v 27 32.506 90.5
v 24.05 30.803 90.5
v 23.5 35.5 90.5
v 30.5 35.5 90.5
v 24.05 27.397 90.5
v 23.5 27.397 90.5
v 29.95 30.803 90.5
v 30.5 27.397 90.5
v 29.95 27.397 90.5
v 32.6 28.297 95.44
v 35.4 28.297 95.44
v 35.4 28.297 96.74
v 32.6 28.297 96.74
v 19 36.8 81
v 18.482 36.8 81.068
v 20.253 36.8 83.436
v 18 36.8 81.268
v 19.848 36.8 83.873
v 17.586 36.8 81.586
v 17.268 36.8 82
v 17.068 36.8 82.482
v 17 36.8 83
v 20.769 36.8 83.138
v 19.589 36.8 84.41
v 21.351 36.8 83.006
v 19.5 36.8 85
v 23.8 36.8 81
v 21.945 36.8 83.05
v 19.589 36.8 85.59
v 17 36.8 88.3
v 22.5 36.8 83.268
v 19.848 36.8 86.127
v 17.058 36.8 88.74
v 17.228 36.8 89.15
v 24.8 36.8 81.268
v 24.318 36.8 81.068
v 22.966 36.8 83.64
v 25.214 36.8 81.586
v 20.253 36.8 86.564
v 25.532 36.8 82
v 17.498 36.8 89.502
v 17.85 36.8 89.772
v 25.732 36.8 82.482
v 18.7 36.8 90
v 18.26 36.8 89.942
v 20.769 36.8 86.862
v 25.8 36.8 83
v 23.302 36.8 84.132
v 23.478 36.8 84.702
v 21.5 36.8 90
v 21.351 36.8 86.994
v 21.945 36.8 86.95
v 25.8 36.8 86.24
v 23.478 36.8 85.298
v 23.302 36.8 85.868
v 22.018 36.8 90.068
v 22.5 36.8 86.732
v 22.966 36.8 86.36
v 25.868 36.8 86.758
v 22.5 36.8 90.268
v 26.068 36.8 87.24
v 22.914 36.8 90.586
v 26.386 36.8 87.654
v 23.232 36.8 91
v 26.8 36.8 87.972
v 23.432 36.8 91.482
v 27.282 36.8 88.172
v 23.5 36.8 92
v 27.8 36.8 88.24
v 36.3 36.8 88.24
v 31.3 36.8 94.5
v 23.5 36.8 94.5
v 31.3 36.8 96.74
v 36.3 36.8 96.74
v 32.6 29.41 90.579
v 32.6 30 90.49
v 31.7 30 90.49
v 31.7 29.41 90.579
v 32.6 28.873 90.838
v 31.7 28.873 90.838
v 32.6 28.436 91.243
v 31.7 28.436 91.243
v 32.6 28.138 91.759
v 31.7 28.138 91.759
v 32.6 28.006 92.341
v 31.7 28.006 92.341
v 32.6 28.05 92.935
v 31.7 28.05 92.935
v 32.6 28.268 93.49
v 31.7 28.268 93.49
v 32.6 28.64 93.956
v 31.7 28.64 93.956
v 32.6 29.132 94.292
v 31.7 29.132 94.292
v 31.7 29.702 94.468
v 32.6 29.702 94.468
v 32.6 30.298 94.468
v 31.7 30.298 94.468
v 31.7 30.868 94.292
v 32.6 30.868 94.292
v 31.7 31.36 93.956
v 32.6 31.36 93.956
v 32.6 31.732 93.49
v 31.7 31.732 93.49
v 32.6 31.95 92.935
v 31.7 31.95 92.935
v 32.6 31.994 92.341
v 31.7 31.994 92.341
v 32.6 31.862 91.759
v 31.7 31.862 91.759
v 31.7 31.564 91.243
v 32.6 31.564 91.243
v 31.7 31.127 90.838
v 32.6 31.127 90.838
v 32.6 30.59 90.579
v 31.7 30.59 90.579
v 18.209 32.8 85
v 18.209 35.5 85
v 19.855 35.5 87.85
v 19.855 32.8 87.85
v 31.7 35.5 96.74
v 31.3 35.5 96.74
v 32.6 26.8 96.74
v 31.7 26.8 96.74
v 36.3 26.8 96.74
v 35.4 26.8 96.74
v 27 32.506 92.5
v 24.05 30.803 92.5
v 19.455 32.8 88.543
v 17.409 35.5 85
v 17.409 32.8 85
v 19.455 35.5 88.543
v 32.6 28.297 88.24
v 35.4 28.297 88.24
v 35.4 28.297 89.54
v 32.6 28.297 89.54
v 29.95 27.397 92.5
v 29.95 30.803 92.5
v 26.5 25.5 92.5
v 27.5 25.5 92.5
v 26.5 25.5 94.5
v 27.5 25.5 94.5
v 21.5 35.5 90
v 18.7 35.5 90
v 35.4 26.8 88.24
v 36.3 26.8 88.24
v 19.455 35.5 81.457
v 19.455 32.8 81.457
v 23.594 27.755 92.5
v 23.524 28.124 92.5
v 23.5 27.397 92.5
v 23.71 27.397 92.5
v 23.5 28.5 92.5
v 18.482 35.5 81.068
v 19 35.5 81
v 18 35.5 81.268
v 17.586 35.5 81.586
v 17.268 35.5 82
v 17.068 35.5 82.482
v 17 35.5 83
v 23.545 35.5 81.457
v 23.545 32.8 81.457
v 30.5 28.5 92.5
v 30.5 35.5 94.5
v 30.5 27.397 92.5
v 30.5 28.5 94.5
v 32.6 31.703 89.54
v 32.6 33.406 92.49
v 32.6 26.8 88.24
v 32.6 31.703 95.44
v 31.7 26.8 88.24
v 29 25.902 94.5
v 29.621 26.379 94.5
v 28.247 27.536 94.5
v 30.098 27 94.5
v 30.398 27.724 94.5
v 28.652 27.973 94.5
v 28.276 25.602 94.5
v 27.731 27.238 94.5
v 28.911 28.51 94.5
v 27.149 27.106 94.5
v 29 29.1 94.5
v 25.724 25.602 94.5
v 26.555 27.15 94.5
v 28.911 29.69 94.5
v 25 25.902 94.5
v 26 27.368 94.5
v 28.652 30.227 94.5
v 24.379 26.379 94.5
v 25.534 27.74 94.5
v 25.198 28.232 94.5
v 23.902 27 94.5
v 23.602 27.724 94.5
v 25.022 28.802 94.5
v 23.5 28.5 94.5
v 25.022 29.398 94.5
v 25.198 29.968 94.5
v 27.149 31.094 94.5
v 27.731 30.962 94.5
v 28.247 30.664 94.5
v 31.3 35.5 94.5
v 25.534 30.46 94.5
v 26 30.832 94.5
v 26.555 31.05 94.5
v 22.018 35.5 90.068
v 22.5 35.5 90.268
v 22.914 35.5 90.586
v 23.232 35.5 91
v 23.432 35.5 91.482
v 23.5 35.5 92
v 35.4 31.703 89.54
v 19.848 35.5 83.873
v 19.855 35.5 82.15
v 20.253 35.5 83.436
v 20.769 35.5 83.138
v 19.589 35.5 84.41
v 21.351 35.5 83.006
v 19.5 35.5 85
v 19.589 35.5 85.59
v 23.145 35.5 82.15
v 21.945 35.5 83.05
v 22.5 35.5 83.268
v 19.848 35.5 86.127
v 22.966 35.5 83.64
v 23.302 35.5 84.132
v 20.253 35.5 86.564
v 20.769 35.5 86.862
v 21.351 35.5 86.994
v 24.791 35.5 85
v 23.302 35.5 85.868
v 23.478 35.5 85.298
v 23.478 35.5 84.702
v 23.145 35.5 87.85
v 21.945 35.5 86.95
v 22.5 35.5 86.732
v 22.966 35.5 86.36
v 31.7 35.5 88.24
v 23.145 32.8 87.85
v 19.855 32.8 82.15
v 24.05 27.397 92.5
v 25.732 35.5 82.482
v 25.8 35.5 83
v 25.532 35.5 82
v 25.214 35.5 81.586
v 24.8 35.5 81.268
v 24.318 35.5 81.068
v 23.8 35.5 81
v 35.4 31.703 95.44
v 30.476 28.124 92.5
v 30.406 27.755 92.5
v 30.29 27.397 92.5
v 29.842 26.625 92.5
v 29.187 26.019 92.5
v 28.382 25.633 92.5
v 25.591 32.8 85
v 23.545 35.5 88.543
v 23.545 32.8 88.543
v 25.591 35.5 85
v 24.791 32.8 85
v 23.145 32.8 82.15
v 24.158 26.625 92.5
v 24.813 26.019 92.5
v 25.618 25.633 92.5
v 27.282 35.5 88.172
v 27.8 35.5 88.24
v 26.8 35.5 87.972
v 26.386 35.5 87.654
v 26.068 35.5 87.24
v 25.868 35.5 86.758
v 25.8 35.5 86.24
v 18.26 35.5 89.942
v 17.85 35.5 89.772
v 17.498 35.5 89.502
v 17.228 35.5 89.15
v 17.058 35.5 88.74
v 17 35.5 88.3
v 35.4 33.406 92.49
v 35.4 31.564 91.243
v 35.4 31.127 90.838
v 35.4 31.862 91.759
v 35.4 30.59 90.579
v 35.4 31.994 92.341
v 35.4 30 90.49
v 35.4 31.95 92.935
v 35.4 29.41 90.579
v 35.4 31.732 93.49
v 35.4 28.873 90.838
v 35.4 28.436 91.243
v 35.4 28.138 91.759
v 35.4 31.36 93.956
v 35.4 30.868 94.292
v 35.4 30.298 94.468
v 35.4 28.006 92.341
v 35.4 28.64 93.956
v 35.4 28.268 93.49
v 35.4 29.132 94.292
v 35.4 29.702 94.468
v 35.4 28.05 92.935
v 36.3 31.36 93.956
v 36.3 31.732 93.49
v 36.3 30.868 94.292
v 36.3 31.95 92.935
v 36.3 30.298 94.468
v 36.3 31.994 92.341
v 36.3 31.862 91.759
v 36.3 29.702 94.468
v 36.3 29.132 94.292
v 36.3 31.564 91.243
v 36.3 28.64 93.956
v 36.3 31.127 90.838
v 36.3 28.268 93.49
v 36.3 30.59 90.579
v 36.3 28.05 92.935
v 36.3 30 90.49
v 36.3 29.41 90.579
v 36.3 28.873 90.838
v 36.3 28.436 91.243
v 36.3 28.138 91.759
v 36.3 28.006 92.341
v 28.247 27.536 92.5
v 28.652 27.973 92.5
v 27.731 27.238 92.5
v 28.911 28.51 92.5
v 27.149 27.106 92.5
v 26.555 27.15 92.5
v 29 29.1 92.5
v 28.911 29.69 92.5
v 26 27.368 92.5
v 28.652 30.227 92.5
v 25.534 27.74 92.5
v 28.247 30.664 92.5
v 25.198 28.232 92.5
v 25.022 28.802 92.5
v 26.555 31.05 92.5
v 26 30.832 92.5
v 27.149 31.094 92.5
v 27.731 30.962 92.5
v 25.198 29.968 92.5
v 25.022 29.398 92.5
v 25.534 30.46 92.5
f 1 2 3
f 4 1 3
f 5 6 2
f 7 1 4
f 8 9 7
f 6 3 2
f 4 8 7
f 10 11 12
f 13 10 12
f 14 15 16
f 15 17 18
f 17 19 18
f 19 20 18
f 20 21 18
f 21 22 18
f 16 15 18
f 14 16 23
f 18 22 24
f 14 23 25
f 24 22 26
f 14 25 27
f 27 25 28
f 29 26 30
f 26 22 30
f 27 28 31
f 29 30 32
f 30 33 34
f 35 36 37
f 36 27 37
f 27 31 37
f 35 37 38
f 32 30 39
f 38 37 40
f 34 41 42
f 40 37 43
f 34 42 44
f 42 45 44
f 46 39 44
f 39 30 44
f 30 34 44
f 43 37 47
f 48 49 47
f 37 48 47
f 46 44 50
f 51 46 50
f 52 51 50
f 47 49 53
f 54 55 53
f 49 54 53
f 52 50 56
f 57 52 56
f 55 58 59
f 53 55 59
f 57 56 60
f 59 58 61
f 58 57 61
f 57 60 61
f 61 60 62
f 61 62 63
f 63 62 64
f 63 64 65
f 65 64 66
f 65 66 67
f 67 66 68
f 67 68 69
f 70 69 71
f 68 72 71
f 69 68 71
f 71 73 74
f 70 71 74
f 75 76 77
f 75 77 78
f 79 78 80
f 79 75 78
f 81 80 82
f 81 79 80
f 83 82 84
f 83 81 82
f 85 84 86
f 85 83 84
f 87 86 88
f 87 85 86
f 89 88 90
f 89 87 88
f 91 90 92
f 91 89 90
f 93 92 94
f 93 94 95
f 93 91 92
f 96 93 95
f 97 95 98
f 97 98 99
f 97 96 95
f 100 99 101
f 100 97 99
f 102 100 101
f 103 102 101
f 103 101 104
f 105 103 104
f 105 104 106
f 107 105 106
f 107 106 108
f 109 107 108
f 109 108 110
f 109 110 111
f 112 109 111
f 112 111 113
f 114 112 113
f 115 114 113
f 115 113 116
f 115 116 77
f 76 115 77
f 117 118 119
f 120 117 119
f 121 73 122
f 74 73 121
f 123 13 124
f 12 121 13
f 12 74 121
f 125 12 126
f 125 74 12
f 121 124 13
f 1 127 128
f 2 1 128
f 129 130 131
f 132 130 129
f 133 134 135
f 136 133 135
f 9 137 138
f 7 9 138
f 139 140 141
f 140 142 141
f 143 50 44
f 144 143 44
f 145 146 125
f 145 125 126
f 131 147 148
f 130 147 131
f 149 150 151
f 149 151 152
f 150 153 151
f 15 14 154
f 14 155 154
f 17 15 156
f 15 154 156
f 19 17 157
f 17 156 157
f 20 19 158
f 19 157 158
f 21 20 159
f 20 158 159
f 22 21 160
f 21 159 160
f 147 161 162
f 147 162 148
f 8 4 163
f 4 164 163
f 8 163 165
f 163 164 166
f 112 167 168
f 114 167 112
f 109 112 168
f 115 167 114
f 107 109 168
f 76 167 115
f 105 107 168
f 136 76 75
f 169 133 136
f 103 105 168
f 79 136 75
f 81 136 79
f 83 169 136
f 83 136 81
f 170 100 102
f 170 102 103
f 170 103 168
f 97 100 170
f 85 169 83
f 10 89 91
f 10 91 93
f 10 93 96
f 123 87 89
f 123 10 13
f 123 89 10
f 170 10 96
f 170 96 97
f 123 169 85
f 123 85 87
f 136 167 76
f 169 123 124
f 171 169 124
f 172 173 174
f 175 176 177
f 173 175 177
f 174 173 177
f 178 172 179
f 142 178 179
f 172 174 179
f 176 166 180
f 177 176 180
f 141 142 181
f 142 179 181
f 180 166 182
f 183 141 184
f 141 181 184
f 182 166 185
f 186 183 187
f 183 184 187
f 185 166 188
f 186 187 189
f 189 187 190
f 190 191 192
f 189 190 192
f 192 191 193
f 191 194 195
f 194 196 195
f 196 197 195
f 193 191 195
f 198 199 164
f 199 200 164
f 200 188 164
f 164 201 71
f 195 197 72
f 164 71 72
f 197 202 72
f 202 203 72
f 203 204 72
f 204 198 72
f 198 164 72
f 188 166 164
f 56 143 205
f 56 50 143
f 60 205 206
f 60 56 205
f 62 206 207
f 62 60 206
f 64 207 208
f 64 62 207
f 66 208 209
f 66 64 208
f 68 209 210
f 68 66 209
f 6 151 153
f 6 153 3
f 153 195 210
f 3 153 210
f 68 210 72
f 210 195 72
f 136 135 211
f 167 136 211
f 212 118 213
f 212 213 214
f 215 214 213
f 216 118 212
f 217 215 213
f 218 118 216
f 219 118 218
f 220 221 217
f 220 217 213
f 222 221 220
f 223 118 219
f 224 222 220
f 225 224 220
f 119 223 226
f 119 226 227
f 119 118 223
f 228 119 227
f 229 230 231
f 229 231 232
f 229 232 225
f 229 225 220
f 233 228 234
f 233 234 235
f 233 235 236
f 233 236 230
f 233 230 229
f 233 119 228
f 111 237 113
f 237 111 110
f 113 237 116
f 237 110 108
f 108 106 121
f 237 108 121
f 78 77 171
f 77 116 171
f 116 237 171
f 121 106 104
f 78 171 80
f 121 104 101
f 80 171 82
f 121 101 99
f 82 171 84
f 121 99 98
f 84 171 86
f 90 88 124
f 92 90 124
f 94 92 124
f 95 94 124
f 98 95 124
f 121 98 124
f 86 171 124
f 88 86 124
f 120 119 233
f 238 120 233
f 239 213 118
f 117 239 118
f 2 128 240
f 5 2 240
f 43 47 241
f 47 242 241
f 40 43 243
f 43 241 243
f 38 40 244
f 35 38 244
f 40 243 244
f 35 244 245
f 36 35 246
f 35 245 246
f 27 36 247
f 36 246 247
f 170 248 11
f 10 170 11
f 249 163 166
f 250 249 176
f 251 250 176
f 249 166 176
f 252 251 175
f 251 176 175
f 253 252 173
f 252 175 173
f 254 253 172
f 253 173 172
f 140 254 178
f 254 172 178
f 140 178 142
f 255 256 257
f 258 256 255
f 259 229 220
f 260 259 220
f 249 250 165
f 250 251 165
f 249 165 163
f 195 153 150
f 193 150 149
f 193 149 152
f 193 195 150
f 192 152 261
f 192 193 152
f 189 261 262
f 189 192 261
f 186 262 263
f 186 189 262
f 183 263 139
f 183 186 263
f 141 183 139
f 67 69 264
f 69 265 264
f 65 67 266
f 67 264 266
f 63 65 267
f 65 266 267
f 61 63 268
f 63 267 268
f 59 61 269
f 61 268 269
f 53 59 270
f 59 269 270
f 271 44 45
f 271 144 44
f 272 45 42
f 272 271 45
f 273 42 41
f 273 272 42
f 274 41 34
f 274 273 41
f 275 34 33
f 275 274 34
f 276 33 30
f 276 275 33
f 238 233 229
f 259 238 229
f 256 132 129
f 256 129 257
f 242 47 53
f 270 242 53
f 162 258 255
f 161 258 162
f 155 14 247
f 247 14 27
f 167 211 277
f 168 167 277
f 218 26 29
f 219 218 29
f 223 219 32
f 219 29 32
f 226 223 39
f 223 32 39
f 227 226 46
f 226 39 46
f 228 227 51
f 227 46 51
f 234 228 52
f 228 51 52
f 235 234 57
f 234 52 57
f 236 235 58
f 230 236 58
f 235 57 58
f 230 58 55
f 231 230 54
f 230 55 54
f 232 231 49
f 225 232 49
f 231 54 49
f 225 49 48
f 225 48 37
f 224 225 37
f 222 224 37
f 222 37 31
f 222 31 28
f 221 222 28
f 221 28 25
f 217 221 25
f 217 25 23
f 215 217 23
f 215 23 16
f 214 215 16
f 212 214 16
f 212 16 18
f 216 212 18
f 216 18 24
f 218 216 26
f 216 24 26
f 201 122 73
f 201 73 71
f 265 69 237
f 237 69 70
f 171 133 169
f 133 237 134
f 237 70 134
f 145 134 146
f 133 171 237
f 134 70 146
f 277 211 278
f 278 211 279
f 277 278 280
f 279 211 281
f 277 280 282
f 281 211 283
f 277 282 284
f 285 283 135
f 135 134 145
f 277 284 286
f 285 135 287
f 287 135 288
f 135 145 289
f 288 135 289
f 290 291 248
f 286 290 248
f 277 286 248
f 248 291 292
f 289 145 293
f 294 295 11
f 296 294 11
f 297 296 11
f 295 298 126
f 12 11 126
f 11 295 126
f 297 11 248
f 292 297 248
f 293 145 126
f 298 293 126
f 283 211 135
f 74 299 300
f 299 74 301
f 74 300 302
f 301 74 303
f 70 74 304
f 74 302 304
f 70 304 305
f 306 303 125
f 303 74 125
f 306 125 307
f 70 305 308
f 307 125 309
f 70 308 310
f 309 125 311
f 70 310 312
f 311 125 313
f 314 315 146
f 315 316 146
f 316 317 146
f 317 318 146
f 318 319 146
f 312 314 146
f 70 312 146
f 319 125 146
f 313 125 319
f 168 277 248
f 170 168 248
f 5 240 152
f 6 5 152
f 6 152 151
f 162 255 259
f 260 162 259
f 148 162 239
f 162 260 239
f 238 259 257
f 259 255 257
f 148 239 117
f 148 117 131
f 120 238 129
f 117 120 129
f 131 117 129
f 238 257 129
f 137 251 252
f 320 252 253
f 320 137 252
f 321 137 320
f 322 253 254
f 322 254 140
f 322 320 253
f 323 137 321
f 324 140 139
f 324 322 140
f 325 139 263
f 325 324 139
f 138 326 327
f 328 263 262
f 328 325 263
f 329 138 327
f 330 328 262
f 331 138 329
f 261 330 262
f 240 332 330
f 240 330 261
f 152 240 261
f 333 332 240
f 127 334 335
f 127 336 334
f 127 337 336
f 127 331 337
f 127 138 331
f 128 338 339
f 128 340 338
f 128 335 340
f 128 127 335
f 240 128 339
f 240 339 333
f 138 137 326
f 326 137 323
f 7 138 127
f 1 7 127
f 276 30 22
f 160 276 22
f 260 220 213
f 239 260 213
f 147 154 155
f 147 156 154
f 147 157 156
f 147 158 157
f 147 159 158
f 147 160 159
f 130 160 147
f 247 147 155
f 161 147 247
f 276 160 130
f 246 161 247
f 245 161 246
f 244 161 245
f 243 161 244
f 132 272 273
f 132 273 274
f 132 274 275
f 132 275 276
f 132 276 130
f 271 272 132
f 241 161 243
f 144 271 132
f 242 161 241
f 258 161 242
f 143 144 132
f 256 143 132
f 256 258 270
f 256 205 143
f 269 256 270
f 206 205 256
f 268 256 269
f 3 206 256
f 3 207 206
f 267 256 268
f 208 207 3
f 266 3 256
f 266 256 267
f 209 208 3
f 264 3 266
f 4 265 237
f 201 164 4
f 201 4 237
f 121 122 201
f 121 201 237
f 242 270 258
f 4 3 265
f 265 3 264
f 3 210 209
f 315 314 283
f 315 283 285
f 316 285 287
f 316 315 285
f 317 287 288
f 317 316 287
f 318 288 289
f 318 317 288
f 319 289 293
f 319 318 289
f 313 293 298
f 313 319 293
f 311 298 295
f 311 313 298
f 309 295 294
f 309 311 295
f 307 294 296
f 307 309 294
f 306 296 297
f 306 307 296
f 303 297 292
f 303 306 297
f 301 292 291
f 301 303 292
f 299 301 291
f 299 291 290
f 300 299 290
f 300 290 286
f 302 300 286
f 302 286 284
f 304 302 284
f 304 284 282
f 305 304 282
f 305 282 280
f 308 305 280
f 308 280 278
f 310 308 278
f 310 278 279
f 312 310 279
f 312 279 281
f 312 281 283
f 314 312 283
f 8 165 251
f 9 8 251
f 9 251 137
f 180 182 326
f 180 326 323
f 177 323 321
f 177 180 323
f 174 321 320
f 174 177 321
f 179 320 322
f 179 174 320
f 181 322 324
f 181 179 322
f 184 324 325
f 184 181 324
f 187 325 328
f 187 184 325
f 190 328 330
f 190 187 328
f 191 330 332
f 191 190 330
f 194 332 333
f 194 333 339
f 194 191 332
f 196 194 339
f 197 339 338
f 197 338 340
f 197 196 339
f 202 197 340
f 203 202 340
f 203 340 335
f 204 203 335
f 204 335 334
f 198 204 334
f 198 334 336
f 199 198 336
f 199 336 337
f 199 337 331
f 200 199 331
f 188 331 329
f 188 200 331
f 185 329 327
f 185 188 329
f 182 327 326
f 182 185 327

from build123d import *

# Parameters (mm, degrees)
SKETCH037_R     = 2
PAD022_DEPTH    = 1.3
PAD023_DEPTH    = 2.7
SKETCH039_W     = 7
SKETCH039_H     = 2
PAD024_DEPTH    = 10
SKETCH040_R     = 2
POCKET010_DEPTH = 2
SKETCH041_W     = 8.5
SKETCH041_H     = 8.9
SKETCH041_R     = 2
PAD025_DEPTH    = 5
POCKET011_START = -0.9
POCKET011_DEPTH = 2.8
SKETCH043_W     = 4.5
SKETCH043_H     = 4.5
POCKET012_DEPTH = 1.301
FILLET005_R     = 2
FILLET006_R     = 1.7
FILLET007_R     = 3
SKETCH052_W     = 5
SKETCH052_H     = 8.5
POCKET017_DEPTH = 0.2
SKETCH053_W     = 0.4
SKETCH053_H     = 8.5
POCKET018_DEPTH = 8.7
PAD031_DEPTH    = 2


with BuildPart() as f_3dp_angle_bracket_top:
    # Sketch037 → Pad022 (new body)
    with BuildSketch(Plane.XZ):
        Polygon((4.5, -4), (-4.3, -4), (-4.3, 3.24), (-14.8, 3.24), (-14.8, 7.49), (-14.8, 11.74), (-9.8, 11.74), (-9.8, 9.5), (2.5, 9.5), (2.5, 5), (4.5, 5), align=None)
        Circle(SKETCH037_R, mode=Mode.SUBTRACT)
    extrude(amount=PAD022_DEPTH)

    # Sketch038 (on Face14 of Pad022) → Pad023 (join)
    with BuildSketch(Plane.XZ.offset(1.3)):
        Polygon((-4.090897, 0), (-2.045448, -3.54282), (2.045448, -3.54282), (4.090897, 0), (2.045448, 3.54282), (-2.045448, 3.54282), align=None)
        Polygon((-3.290897, 0), (-1.645448, -2.85), (1.645448, -2.85), (3.290897, 0), (1.645448, 2.85), (-1.645448, 2.85), align=None, mode=Mode.SUBTRACT)
    extrude(amount=PAD023_DEPTH)

    # Sketch039 (on Face5 of Pad023) → Pad024 (join)
    with BuildSketch(Plane.XZ.offset(1.3)):
        with Locations((-5.5, 8.5)):
            Rectangle(SKETCH039_W, SKETCH039_H)
    extrude(amount=PAD024_DEPTH)

    # Sketch040 (on Face24 of Pad024) → Pocket010 (cut)
    with BuildSketch(Plane(origin=(0, 0, 9.5), x_dir=(-1, 0, 0), z_dir=(0, 0, 1))):
        with Locations((5.5, 7.7)):
            Circle(SKETCH040_R)
    extrude(amount=-POCKET010_DEPTH, mode=Mode.SUBTRACT)

    # Sketch041 (on Face6 of Pocket010) → Pad025 (join)
    with BuildSketch(Plane(origin=(-14.8, 0, 0), x_dir=(0, 0, -1), z_dir=(-1, 0, 0))):
        with Locations((-7.49, 5.75)):
            Rectangle(SKETCH041_W, SKETCH041_H)
        with Locations((-7.49, 6.8)):
            Circle(SKETCH041_R, mode=Mode.SUBTRACT)
    extrude(amount=-PAD025_DEPTH)

    # Sketch042 (on Face7 of Pad025) → Pocket011 (cut)
    with BuildSketch(Plane(origin=(-14.8, 0, 0), x_dir=(0, 0, -1), z_dir=(-1, 0, 0)).offset(POCKET011_START)):
        Polygon((-10.44, 8.503183), (-11.74, 8.503183), (-11.74, 10.2), (-3.24, 10.2), (-3.24, 8.503183), (-4.54, 8.503183), (-4.54, 5.096817), (-7.49, 3.393633), (-10.44, 5.096817), align=None)
    extrude(amount=-POCKET011_DEPTH, mode=Mode.SUBTRACT)

    # Sketch043 (on Face24 of Pocket011) → Pocket012 (cut, through all)
    with BuildSketch(Plane.XZ.offset(1.3)):
        with Locations((0.25, 7.25)):
            Rectangle(SKETCH043_W, SKETCH043_H)
    extrude(amount=-POCKET012_DEPTH, mode=Mode.SUBTRACT)

    # Fillet005
    fillet005_edges = [f_3dp_angle_bracket_top.edges().sort_by_distance(p)[0] for p in [
        (-2, -0.65, 5),
        (4.5, -0.65, -4),
        (-4.3, -0.65, -4),
        (-4.3, -0.65, 3.24),
    ]]
    fillet(fillet005_edges, radius=FILLET005_R)

    # Fillet006
    fillet006_edges = [f_3dp_angle_bracket_top.edges().sort_by_distance(p)[0] for p in [
        (4.5, -0.65, 5),
    ]]
    fillet(fillet006_edges, radius=FILLET006_R)

    # Fillet007
    fillet007_edges = [f_3dp_angle_bracket_top.edges().sort_by_distance(p)[0] for p in [
        (-9, -11.3, 8.5),
        (-2, -11.3, 8.5),
    ]]
    fillet(fillet007_edges, radius=FILLET007_R)

    # Sketch052 (on Face43 of Fillet007) → Pocket017 (cut)
    with BuildSketch(Plane.XZ.offset(10.2)):
        with Locations((-12.3, 7.49)):
            Rectangle(SKETCH052_W, SKETCH052_H)
    extrude(amount=-POCKET017_DEPTH, mode=Mode.SUBTRACT)

    # Sketch053 (on Face37 of Pocket017) → Pocket018 (cut)
    with BuildSketch(Plane.XZ.offset(10)):
        with Locations((-10, 7.49)):
            Rectangle(SKETCH053_W, SKETCH053_H)
    extrude(amount=-POCKET018_DEPTH, mode=Mode.SUBTRACT)

    # Sketch055 (on Face2 of Pocket018) → Pad031 (join)
    with BuildSketch(Plane(origin=(0, 0, 7.5), x_dir=(1, 0, 0), z_dir=(0, 0, -1))):
        Polygon((-8.45, 9.403183), (-8.45, 5.996817), (-5.5, 4.293633), (-2.55, 5.996817), (-2.55, 9.403183), (-2, 9.403183), (-2, 1.3), (-9, 1.3), (-9, 9.403183), align=None)
    extrude(amount=PAD031_DEPTH)


with BuildPart() as f_3dp_angle_bracket_top_1:
    # Body024 placement: moved
    add(f_3dp_angle_bracket_top.part.moved(Location((-21.5, 36.8, 85))))


with BuildPart() as part_mirroring001:
    # Part__Mirroring001: instance of 3DP_Angle_bracket_Top
    add(f_3dp_angle_bracket_top_1.part.mirror(Plane(origin=(0, 0, 0), x_dir=(0, -1, 0), z_dir=(1, 0, 0))))


solid = part_mirroring001.part
